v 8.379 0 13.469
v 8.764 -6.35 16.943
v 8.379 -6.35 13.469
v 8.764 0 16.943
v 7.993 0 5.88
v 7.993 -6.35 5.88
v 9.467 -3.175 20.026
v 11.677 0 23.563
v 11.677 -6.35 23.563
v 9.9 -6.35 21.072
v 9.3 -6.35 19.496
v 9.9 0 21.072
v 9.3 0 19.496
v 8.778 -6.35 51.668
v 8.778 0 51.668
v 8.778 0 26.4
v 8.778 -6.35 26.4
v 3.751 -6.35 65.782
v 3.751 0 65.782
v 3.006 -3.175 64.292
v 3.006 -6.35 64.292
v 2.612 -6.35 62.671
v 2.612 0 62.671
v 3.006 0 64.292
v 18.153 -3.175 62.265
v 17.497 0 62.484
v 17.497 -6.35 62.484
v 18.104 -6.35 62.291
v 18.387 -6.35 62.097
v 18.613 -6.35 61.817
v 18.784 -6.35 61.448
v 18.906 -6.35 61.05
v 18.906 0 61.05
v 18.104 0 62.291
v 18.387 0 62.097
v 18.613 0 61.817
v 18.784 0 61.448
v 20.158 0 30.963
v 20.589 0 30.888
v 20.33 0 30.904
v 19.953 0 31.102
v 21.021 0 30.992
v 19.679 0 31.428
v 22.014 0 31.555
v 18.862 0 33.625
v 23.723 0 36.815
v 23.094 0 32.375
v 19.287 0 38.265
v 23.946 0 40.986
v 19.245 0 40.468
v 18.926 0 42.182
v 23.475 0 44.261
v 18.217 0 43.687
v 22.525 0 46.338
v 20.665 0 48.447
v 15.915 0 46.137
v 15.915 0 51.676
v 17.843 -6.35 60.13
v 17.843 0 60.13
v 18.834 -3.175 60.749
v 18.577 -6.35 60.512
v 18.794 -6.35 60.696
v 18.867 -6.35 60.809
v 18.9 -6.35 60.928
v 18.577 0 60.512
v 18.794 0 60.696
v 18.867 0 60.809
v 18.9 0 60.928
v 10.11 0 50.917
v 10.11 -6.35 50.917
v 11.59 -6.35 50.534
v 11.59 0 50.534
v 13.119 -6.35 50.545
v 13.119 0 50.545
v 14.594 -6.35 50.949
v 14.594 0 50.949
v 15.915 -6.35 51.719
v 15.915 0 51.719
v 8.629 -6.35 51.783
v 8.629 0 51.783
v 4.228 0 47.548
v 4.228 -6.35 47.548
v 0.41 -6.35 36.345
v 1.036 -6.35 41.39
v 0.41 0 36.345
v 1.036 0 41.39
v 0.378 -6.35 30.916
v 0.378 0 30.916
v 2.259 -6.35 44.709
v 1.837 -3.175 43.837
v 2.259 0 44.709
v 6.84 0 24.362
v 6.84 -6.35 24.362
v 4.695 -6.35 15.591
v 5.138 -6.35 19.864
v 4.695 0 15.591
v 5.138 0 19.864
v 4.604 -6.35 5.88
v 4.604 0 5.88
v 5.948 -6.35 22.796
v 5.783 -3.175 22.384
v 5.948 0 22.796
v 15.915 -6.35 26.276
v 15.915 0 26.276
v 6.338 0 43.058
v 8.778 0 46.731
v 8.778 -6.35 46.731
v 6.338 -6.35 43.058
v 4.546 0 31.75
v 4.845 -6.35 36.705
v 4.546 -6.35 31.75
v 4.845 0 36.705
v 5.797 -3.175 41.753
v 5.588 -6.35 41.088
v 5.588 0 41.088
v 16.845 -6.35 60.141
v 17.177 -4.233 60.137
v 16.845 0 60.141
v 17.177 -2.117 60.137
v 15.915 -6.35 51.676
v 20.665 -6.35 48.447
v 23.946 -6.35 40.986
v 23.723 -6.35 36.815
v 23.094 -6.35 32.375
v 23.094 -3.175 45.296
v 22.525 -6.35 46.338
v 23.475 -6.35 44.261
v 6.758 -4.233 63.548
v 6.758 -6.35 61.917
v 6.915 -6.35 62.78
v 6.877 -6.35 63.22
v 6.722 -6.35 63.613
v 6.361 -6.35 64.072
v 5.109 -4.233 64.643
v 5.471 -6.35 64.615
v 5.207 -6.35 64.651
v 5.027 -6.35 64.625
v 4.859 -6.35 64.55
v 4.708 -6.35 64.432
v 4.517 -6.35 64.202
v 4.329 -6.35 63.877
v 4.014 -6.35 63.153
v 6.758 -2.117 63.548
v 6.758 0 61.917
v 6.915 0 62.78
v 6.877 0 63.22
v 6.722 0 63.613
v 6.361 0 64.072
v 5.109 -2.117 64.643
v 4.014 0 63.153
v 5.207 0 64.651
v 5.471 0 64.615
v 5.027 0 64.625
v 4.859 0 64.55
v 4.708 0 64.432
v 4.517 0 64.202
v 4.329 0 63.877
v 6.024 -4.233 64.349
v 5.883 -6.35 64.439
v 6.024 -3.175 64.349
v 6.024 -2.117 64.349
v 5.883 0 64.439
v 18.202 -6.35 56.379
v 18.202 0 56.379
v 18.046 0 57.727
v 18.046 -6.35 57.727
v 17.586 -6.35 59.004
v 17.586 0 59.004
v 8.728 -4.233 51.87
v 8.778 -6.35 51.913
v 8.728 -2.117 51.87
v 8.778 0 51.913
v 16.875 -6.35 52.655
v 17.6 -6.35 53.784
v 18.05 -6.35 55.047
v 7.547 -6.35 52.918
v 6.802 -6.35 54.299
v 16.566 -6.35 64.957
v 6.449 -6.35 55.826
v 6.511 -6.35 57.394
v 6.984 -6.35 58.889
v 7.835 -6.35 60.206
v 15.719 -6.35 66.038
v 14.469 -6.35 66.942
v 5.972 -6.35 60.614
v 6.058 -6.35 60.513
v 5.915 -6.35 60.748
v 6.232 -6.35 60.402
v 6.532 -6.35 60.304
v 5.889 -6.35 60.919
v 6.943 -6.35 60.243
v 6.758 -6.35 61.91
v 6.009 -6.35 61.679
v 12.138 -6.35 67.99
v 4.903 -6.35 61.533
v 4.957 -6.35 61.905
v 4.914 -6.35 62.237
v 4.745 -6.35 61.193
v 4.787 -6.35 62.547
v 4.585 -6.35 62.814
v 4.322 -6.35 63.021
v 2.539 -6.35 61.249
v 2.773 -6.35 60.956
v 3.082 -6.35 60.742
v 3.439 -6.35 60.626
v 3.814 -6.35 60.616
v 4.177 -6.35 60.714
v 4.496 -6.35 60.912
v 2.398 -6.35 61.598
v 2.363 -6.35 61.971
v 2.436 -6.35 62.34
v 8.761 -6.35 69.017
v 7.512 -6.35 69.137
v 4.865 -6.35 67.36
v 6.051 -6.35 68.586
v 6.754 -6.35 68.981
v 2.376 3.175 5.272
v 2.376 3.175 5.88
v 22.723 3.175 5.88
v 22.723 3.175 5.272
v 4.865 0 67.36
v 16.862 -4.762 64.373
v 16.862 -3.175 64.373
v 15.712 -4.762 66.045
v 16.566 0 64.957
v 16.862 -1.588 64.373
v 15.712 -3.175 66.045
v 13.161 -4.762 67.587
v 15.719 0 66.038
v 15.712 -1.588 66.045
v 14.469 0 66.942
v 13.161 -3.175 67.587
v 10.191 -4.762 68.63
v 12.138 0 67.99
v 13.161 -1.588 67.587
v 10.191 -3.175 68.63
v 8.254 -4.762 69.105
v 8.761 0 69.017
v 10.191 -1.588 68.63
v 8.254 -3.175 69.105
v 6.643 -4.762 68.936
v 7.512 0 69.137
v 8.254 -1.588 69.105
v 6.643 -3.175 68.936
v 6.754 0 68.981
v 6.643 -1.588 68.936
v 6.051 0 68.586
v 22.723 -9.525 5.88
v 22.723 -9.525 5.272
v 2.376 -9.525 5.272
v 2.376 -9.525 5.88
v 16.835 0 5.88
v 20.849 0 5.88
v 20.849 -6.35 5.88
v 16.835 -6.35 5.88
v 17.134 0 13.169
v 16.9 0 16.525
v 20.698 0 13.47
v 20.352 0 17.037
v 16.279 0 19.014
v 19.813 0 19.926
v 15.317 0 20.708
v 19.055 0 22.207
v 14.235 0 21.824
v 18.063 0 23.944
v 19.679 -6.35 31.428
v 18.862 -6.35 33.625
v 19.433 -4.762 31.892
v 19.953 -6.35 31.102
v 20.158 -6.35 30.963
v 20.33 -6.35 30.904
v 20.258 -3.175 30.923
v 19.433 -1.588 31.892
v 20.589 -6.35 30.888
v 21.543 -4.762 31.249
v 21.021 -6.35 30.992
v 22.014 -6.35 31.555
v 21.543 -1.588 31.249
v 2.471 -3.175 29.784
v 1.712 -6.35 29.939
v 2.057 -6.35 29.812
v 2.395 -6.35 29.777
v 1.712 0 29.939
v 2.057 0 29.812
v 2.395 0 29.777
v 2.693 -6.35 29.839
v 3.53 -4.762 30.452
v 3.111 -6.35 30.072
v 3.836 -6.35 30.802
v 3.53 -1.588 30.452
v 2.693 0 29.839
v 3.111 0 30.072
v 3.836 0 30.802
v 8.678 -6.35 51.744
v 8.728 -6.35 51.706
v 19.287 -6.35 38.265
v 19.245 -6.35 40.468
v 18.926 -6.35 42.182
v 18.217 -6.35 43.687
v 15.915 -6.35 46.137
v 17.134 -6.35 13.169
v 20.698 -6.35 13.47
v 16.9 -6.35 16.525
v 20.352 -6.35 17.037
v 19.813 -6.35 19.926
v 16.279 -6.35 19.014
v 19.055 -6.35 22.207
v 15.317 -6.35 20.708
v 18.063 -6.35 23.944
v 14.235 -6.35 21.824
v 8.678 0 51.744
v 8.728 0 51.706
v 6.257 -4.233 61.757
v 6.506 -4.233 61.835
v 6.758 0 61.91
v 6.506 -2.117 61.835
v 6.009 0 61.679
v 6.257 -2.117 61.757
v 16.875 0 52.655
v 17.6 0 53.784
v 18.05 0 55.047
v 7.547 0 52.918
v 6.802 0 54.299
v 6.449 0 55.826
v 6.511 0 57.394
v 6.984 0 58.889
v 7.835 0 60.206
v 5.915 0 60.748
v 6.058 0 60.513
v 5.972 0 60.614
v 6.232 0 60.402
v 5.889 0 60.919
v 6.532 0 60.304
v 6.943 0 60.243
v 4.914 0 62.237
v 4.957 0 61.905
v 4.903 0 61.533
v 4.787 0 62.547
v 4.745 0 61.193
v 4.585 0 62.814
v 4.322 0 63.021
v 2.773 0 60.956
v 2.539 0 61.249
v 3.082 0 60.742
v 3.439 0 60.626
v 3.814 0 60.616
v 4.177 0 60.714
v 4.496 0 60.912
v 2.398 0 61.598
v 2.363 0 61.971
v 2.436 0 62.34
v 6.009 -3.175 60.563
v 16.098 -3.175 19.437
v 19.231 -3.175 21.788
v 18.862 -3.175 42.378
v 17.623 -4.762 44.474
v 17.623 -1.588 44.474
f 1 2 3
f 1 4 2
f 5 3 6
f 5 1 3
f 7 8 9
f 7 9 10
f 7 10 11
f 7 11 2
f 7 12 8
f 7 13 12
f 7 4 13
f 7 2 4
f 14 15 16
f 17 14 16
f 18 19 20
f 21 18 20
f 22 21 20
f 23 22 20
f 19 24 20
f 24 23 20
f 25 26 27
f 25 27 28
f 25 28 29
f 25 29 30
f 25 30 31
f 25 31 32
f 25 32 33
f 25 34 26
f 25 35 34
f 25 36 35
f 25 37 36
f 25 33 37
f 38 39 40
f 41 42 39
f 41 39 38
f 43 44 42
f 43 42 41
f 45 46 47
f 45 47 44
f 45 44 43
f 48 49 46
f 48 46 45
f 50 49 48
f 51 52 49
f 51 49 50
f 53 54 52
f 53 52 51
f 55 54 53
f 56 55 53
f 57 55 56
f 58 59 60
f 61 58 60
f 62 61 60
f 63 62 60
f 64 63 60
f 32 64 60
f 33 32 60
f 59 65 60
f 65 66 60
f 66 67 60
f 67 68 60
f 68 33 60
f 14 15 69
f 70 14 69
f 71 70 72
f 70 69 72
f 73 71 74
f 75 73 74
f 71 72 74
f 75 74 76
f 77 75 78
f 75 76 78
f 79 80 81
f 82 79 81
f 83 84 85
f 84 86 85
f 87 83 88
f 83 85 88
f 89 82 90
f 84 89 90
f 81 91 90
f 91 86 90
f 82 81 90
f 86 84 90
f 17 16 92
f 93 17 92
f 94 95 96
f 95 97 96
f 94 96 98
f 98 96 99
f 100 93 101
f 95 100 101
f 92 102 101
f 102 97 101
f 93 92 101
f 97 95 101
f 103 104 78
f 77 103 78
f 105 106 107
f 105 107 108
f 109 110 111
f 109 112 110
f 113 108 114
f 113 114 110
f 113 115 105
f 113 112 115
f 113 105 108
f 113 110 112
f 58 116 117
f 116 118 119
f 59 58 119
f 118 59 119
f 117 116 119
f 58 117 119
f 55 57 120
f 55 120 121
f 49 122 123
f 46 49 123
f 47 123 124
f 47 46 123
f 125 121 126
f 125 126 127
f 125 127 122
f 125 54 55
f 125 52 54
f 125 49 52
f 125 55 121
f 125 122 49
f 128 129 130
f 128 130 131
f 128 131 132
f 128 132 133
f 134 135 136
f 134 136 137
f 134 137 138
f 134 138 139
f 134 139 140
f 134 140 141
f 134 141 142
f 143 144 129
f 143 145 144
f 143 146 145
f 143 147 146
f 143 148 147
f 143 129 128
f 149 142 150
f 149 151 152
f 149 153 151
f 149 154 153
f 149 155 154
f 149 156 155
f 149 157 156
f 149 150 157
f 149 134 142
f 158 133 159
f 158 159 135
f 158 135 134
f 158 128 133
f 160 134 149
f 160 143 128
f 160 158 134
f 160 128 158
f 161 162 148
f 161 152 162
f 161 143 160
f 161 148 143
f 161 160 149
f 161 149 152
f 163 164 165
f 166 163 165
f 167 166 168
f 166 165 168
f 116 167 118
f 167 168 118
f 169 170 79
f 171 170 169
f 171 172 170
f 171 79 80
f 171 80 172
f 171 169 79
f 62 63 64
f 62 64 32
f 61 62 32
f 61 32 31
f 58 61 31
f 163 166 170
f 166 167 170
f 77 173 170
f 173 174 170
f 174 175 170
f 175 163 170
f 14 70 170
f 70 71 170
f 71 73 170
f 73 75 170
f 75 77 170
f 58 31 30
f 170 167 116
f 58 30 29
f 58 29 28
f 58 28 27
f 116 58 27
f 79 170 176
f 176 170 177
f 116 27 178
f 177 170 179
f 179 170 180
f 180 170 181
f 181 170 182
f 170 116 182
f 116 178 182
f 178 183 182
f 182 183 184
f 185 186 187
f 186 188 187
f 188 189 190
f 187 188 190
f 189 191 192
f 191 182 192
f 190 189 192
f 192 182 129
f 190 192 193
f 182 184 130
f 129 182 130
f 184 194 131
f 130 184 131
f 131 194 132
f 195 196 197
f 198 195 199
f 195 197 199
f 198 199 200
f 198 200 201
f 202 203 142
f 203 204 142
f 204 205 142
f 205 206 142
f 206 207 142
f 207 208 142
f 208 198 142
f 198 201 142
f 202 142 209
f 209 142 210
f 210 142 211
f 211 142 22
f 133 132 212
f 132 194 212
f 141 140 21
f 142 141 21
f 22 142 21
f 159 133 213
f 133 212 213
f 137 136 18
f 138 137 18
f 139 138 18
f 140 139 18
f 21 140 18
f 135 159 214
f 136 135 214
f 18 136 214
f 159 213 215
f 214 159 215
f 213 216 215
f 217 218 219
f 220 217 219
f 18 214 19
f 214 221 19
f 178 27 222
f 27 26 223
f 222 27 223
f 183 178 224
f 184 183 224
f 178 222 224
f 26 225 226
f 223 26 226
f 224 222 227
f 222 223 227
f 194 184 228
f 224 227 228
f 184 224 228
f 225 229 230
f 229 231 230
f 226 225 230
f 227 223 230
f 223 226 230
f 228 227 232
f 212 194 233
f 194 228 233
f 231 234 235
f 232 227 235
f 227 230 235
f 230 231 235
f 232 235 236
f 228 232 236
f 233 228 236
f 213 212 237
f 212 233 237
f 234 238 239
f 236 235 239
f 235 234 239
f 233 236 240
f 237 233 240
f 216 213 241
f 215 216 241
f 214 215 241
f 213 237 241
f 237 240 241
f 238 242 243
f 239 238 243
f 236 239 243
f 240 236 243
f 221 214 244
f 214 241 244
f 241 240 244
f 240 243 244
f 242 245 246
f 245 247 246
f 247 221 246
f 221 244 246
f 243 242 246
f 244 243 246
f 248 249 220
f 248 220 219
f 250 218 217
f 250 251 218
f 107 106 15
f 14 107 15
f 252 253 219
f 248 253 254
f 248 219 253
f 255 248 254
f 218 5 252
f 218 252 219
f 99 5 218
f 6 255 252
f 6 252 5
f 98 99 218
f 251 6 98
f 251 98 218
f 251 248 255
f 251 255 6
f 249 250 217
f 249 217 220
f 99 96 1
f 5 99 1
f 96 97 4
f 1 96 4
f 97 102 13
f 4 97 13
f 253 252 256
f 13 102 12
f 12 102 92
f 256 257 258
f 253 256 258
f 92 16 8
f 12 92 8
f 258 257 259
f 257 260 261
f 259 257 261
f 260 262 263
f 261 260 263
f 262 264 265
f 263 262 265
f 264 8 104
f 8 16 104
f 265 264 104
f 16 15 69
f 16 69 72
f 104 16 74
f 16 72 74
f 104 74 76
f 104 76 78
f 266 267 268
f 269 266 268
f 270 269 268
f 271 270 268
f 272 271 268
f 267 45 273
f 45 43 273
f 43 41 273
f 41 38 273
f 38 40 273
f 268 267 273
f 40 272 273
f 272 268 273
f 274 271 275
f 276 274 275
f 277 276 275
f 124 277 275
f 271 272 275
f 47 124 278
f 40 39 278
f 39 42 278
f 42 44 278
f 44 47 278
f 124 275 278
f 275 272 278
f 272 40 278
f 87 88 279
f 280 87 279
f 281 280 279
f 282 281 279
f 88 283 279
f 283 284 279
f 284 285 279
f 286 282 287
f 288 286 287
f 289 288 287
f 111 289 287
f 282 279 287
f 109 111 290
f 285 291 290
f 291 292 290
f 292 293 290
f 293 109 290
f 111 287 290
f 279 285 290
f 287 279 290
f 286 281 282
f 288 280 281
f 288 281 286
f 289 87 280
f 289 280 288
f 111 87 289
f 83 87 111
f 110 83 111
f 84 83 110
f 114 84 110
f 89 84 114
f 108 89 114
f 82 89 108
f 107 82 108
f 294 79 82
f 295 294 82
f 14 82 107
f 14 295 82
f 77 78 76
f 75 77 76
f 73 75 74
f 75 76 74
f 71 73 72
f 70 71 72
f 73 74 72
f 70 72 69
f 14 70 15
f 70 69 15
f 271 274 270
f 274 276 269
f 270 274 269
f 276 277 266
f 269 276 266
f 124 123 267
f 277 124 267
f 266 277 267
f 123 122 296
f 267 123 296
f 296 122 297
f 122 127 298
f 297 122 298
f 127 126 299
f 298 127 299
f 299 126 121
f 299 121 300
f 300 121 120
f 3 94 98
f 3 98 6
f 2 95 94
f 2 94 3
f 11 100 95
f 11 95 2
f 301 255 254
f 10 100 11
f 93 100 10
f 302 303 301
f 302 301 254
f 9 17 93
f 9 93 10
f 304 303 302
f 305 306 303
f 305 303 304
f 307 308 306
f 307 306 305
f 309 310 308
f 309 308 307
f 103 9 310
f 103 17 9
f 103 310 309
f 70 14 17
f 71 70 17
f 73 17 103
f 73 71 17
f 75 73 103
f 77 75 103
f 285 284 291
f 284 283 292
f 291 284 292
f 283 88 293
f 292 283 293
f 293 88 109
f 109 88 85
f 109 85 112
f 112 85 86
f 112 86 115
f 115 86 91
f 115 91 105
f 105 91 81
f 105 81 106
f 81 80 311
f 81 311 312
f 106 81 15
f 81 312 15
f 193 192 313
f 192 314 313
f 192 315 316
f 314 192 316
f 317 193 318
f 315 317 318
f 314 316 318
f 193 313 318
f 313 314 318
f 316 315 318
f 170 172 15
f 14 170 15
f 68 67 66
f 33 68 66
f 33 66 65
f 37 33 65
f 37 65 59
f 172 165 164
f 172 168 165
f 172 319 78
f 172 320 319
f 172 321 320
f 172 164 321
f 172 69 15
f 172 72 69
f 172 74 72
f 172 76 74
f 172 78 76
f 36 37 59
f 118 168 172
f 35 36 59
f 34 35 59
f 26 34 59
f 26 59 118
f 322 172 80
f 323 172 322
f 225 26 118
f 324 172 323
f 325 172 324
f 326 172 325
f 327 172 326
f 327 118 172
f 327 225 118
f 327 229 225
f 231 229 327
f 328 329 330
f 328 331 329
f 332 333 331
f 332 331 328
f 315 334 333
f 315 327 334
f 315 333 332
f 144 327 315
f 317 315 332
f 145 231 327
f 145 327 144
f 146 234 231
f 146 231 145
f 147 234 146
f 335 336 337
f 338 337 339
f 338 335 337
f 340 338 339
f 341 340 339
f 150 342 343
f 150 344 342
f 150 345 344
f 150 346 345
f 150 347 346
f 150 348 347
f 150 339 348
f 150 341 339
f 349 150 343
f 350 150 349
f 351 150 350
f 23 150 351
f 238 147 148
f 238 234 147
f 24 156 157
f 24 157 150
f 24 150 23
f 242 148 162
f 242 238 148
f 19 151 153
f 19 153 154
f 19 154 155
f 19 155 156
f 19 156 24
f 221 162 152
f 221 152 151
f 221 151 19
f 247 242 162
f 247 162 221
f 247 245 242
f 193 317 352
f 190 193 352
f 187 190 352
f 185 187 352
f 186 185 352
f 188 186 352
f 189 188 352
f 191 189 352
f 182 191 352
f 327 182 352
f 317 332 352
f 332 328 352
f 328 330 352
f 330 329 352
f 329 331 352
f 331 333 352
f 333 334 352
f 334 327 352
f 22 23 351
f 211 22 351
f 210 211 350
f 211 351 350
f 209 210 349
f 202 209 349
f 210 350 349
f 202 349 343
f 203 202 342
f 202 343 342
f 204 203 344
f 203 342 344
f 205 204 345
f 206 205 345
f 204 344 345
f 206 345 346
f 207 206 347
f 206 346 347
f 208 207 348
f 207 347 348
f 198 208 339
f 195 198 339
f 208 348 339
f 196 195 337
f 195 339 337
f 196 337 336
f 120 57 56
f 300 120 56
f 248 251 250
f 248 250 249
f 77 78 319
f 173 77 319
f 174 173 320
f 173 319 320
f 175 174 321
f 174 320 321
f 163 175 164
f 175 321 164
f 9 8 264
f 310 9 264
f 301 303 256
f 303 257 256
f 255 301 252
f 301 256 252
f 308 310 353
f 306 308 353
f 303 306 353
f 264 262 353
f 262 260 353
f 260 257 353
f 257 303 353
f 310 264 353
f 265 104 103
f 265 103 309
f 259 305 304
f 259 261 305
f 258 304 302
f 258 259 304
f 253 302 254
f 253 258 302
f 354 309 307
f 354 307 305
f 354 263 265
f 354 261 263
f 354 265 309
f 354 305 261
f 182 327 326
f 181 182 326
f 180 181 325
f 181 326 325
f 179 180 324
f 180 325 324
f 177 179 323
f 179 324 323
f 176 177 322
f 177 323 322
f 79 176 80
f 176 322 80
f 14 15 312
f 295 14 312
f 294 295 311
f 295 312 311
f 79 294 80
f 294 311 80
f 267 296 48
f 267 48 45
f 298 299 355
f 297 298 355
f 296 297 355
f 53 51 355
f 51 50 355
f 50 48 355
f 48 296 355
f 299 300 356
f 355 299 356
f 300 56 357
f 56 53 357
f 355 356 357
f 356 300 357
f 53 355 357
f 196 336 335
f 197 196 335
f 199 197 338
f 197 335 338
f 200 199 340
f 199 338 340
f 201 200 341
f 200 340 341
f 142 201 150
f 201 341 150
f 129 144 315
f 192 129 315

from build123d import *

# Parameters (mm, degrees)
F1_DEPTH      = 6.35
F2_DEPTH      = 6.35
F3_DEPTH      = 6.35
F4_DEPTH      = 9.525
F4_DEPTH_BACK = 3.175


with BuildPart() as f1:
    # F0 (on Front) → F1 (new body)
    with BuildSketch(Plane.XZ):
        with BuildLine():
            add(Edge.make_bspline(
                [(12.5273920316, 62.2654363113), (11.0665005488, 62.3360602112), (8.8442124425, 62.44349232), (7.2714353386, 62.060651673), (6.7577791888, 61.9104570378)],
                knots=[0, 0, 0, 0, 0.5622453459, 0.8552799162, 0.8552799162, 0.8552799162, 0.8552799162], degree=3))
            add(Edge.make_bspline(
                [(12.5273920316, 62.2654363113), (14.4334982096, 62.4849367023), (16.3396043875, 62.7044370934), (17.4972117841, 62.4840260477)],
                knots=[0, 0, 0, 0, 0.5424368479, 0.5424368479, 0.5424368479, 0.5424368479], degree=3))
            add(Edge.make_bspline(
                [(17.4972117841, 62.4840260477), (17.131228304, 63.7674361043), (16.3118475747, 66.6371417254), (10.2544145873, 68.6675374002), (6.3848215947, 69.6937644477), (4.6555253466, 67.1251928844), (3.7512006872, 65.7819702002)],
                knots=[0, 0, 0, 0, 0.2370192711, 0.5302132229, 0.7543411243, 1, 1, 1, 1], degree=3))
            add(Edge.make_bspline(
                [(3.7512006872, 65.7819702002), (3.47371571, 65.2962780712), (2.9185056438, 64.3244735364), (2.7142760844, 63.2225765904), (2.612117143, 62.6713898485)],
                knots=[0, 0, 0, 0, 0.4997837648, 1, 1, 1, 1], degree=3))
            ThreePointArc((2.612117143, 62.6713898485), (3.2375221524, 63.1321859018), (4.0140646781, 63.1533077901))
            add(Edge.make_bspline(
                [(6.7577791888, 61.9170552341), (6.8950059127, 62.4629485379), (7.1834179024, 63.6102627739), (4.8781235577, 65.2914251793), (4.2987985192, 63.8578828964), (4.0140646781, 63.1533077901)],
                knots=[0, 0, 0, 0, 0.315798825, 0.6637203371, 1, 1, 1, 1], degree=3))
            Line((6.7577791888, 61.9170552341), (6.7577791888, 61.9104570378))
        make_face()
        with BuildLine():
            add(Edge.make_bspline(
                [(6.009041597, 61.6786472892), (5.904370804, 61.2466490429), (5.6646535589, 60.2562457923), (7.0733189345, 60.2170169151), (7.8349941244, 60.2060435593)],
                knots=[0, 0, 0, 0, 0.1549010167, 0.354977491, 0.354977491, 0.354977491, 0.354977491], degree=3))
            ThreePointArc((7.8349941244, 60.2060435593), (9.9454909566, 61.7727954048), (12.5273920316, 62.2654363113))
            add(Edge.make_bspline(
                [(12.5273920316, 62.2654363113), (11.0665005488, 62.3360602112), (8.8442124425, 62.44349232), (7.2714353386, 62.060651673), (6.7577791888, 61.9104570378)],
                knots=[0, 0, 0, 0, 0.5622453459, 0.8552799162, 0.8552799162, 0.8552799162, 0.8552799162], degree=3))
            add(Edge.make_bspline(
                [(6.7577791888, 61.9104570378), (6.5041014027, 61.8362808743), (6.2565714999, 61.7574640817), (6.009041597, 61.6786472892)],
                knots=[0.8552799162, 0.8552799162, 0.8552799162, 0.8552799162, 1, 1, 1, 1], degree=3))
        make_face()
        with BuildLine():
            ThreePointArc((4.9574484228, 61.9047028959), (4.6950868279, 62.6871648872), (4.0140646781, 63.1533077901))
            ThreePointArc((4.0140646781, 63.1533077901), (3.2375221524, 63.1321859018), (2.612117143, 62.6713898485))
            ThreePointArc((2.612117143, 62.6713898485), (3.2561617787, 60.6709699735), (4.9574484228, 61.9047028959))
        make_face()
        with BuildLine():
            ThreePointArc((12.5273920316, 62.2654363113), (9.9454909566, 61.7727954048), (7.8349941244, 60.2060435593))
            add(Edge.make_bspline(
                [(7.8349941244, 60.2060435593), (8.8327434634, 60.1916691139), (10.9678914012, 60.2024010817), (14.6956770928, 60.1644330724), (16.8450292831, 60.1407686277)],
                knots=[0.354977491, 0.354977491, 0.354977491, 0.354977491, 0.6170658099, 0.9488177296, 0.9488177296, 0.9488177296, 0.9488177296], degree=3))
            ThreePointArc((16.8450292831, 60.1407686277), (14.913089748, 61.6641541534), (12.5273920316, 62.2654363113))
        make_face()
        with BuildLine():
            add(Edge.make_bspline(
                [(12.5273920316, 62.2654363113), (14.4334982096, 62.4849367023), (16.3396043875, 62.7044370934), (17.4972117841, 62.4840260477)],
                knots=[0, 0, 0, 0, 0.5424368479, 0.5424368479, 0.5424368479, 0.5424368479], degree=3))
            ThreePointArc((12.5273920316, 62.2654363113), (14.913089748, 61.6641541534), (16.8450292831, 60.1407686277))
            add(Edge.make_bspline(
                [(16.8450292831, 60.1407686277), (17.1766286456, 60.1371177069), (17.5098181067, 60.1334083898), (17.8430177321, 60.1296874803)],
                knots=[0.9488177296, 0.9488177296, 0.9488177296, 0.9488177296, 1, 1, 1, 1], degree=3))
            add(Edge.make_bspline(
                [(17.8430177321, 60.1296874803), (18.2654810629, 60.3270261803), (18.8688055835, 60.6088477442), (18.9091028872, 60.946887792), (18.9059697958, 61.0497425555)],
                knots=[0, 0, 0, 0, 0.6202780275, 0.8858258605, 0.8858258605, 0.8858258605, 0.8858258605], degree=3))
            add(Edge.make_bspline(
                [(17.4972117841, 62.4840260477), (17.7559098923, 62.4347693474), (18.5849756129, 62.1679500619), (18.7722409141, 61.5239286331), (18.9059697958, 61.0497425555)],
                knots=[0.5424368479, 0.5424368479, 0.5424368479, 0.5424368479, 0.6636587637, 0.9965413503, 0.9965413503, 0.9965413503, 0.9965413503], degree=3))
        make_face()
    extrude(amount=F1_DEPTH)

    # F0 (on Front) → F2 (join)
    with BuildSketch(Plane.XZ):
        with BuildLine():
            add(Edge.make_bspline(
                [(8.7776299887, 51.9126306062), (8.7281727167, 51.8695028511), (8.6787154448, 51.826375096), (8.6292658664, 51.7832423898)],
                knots=[0, 0, 0, 0, 0.0085170164, 0.0085170164, 0.0085170164, 0.0085170164], degree=3))
            Line((8.7776299887, 51.9126306062), (8.7776299887, 51.6681820829))
            ThreePointArc((8.7776299887, 51.6681820829), (12.3547755841, 50.4896448018), (15.9146455381, 51.7193791815))
            ThreePointArc((15.9146455381, 51.7193791815), (17.5996578641, 53.7837502792), (18.2024572545, 56.3794250398))
            ThreePointArc((18.2024572545, 56.3794250398), (17.8527165632, 58.3788197159), (16.8450292831, 60.1407686277))
            add(Edge.make_bspline(
                [(7.8349941244, 60.2060435593), (8.8327434634, 60.1916691139), (10.9678914012, 60.2024010817), (14.6956770928, 60.1644330724), (16.8450292831, 60.1407686277)],
                knots=[0.354977491, 0.354977491, 0.354977491, 0.354977491, 0.6170658099, 0.9488177296, 0.9488177296, 0.9488177296, 0.9488177296], degree=3))
            ThreePointArc((7.8349941244, 60.2060435593), (6.4486085126, 55.8264565617), (8.6292658664, 51.7832423898))
        make_face()
    extrude(amount=F2_DEPTH)

    # F0 (on Front) → F2, piece 2 (join)
    with BuildSketch(Plane.XZ):
        with BuildLine():
            ThreePointArc((8.7776299887, 51.6681820829), (8.7029894298, 51.7251210279), (8.6292658664, 51.7832423898))
            add(Edge.make_bspline(
                [(8.6292658664, 51.7832423898), (5.9205845588, 49.4205780584), (0.213119288, 44.3678417914), (0.3210256376, 35.5727294417), (0.3781576179, 30.9160786726)],
                knots=[0.0085170164, 0.0085170164, 0.0085170164, 0.0085170164, 0.4750504809, 1, 1, 1, 1], degree=3))
            add(Edge.make_bspline(
                [(0.3781576179, 30.9160786726), (1.0916232819, 30.3060576849), (2.5870810812, 29.0274248234), (3.873497365, 30.8149660675), (4.5461792801, 31.7496920055)],
                knots=[0, 0, 0, 0, 0.4770884638, 1, 1, 1, 1], degree=3))
            add(Edge.make_bspline(
                [(8.7776299887, 46.7311051809), (7.6389169711, 45.2525194805), (4.9945493676, 41.8522960551), (4.7100603031, 35.4108999093), (4.5461792801, 31.7496920055)],
                knots=[0, 0, 0, 0, 0.4313887892, 1, 1, 1, 1], degree=3))
            Line((8.7776299887, 46.7311051809), (8.7776299887, 51.6681820829))
        make_face()
    extrude(amount=F2_DEPTH)


with BuildPart() as f2:
    # F0 (on Front) → F2, piece 3 (new body)
    with BuildSketch(Plane.XZ):
        with BuildLine():
            add(Edge.make_bspline(
                [(15.9146455381, 51.6756046175), (18.8617016243, 49.9162909289), (25.2269753875, 46.1163926795), (23.8391426655, 37.1759878698), (23.0938621765, 32.3748982551)],
                knots=[0, 0, 0, 0, 0.4629896837, 1, 1, 1, 1], degree=3))
            Line((15.9146455381, 51.6756046175), (15.9146455381, 46.1365057656))
            add(Edge.make_bspline(
                [(15.9146455381, 46.1365057656), (17.1060076807, 45.0776061709), (19.9087614247, 42.5764001113), (19.2443616369, 36.8941326773), (18.8617016243, 33.6252957532)],
                knots=[0, 0, 0, 0, 0.4248525231, 1, 1, 1, 1], degree=3))
            add(Edge.make_bspline(
                [(18.8617016243, 33.6252957532), (19.2139959374, 32.3850863204), (19.9268234755, 29.8756633638), (22.0300794151, 31.5354254083), (23.0938621765, 32.3748982551)],
                knots=[0, 0, 0, 0, 0.4942209641, 1, 1, 1, 1], degree=3))
        make_face()
    extrude(amount=F2_DEPTH)


with BuildPart() as f3:
    # F0 (on Front) → F3 (new body)
    with BuildSketch(Plane.XZ):
        with BuildLine():
            ThreePointArc((15.9146455381, 51.7193791815), (12.3547755841, 50.4896448018), (8.7776299887, 51.6681820829))
            Line((8.7776299887, 51.6681820829), (8.7776299887, 46.7311051809))
            Line((8.7776299887, 46.7311051809), (8.7776299887, 37.7898737788))
            Line((8.7776299887, 37.7898737788), (15.9146455381, 37.7898737788))
            Line((15.9146455381, 37.7898737788), (15.9146455381, 46.1365057656))
            Line((15.9146455381, 46.1365057656), (15.9146455381, 51.6756046175))
            Line((15.9146455381, 51.6756046175), (15.9146455381, 51.7193791815))
        make_face()
        with BuildLine():
            Line((15.9146455381, 37.7898737788), (8.7776299887, 37.7898737788))
            Line((8.7776299887, 37.7898737788), (8.7776299887, 26.3995268025))
            add(Edge.make_bspline(
                [(8.7776299887, 26.3995268025), (7.6405202506, 25.3606990583), (4.4367674116, 22.4338510832), (4.5382966864, 12.3708677415), (4.6037901204, 5.879544552)],
                knots=[0, 0, 0, 0, 0.354930544, 1, 1, 1, 1], degree=3))
            Line((4.6037901204, 5.879544552), (7.9931128837, 5.879544552))
            add(Edge.make_bspline(
                [(11.6771539847, 23.5629523376), (10.8576495842, 22.6254961081), (8.5247561277, 19.9568277005), (8.2022974833, 11.4185048822), (7.9931128837, 5.879544552)],
                knots=[0, 0, 0, 0, 0.3512823949, 1, 1, 1, 1], degree=3))
            add(Edge.make_bspline(
                [(11.6771539847, 23.5629523376), (13.4128809525, 22.5159003213), (17.7494270196, 19.8999420584), (17.1777042751, 11.1357933928), (16.8348167765, 5.879544552)],
                knots=[0, 0, 0, 0, 0.4002556276, 1, 1, 1, 1], degree=3))
            Line((16.8348167765, 5.879544552), (20.848903805, 5.879544552))
            add(Edge.make_bspline(
                [(15.9146455381, 26.2756046175), (17.179349206, 25.0870539626), (20.4648655806, 21.8845867621), (20.9331510716, 12.0046778157), (20.848903805, 5.879544552)],
                knots=[0, 0, 0, 0, 0.3713691356, 1, 1, 1, 1], degree=3))
            Line((15.9146455381, 26.2756046175), (15.9146455381, 37.7898737788))
        make_face()
    extrude(amount=F3_DEPTH)

    # F0 (on Front) → F4 (join, two sides)
    with BuildSketch(Plane.XZ) as f4_sk:
        Polygon((7.9931128837, 5.879544552), (4.6037901204, 5.879544552), (2.3757535964, 5.879544552), (2.3757535964, 5.2718357183), (22.7228850126, 5.2718357183), (22.7228850126, 5.879544552), (20.848903805, 5.879544552), (16.8348167765, 5.879544552), (15.2939865366, 5.879544552), align=None)
    extrude(amount=F4_DEPTH)
    extrude(f4_sk.sketch, amount=-F4_DEPTH_BACK)


solid = Compound([f1.part, f2.part, f3.part])
